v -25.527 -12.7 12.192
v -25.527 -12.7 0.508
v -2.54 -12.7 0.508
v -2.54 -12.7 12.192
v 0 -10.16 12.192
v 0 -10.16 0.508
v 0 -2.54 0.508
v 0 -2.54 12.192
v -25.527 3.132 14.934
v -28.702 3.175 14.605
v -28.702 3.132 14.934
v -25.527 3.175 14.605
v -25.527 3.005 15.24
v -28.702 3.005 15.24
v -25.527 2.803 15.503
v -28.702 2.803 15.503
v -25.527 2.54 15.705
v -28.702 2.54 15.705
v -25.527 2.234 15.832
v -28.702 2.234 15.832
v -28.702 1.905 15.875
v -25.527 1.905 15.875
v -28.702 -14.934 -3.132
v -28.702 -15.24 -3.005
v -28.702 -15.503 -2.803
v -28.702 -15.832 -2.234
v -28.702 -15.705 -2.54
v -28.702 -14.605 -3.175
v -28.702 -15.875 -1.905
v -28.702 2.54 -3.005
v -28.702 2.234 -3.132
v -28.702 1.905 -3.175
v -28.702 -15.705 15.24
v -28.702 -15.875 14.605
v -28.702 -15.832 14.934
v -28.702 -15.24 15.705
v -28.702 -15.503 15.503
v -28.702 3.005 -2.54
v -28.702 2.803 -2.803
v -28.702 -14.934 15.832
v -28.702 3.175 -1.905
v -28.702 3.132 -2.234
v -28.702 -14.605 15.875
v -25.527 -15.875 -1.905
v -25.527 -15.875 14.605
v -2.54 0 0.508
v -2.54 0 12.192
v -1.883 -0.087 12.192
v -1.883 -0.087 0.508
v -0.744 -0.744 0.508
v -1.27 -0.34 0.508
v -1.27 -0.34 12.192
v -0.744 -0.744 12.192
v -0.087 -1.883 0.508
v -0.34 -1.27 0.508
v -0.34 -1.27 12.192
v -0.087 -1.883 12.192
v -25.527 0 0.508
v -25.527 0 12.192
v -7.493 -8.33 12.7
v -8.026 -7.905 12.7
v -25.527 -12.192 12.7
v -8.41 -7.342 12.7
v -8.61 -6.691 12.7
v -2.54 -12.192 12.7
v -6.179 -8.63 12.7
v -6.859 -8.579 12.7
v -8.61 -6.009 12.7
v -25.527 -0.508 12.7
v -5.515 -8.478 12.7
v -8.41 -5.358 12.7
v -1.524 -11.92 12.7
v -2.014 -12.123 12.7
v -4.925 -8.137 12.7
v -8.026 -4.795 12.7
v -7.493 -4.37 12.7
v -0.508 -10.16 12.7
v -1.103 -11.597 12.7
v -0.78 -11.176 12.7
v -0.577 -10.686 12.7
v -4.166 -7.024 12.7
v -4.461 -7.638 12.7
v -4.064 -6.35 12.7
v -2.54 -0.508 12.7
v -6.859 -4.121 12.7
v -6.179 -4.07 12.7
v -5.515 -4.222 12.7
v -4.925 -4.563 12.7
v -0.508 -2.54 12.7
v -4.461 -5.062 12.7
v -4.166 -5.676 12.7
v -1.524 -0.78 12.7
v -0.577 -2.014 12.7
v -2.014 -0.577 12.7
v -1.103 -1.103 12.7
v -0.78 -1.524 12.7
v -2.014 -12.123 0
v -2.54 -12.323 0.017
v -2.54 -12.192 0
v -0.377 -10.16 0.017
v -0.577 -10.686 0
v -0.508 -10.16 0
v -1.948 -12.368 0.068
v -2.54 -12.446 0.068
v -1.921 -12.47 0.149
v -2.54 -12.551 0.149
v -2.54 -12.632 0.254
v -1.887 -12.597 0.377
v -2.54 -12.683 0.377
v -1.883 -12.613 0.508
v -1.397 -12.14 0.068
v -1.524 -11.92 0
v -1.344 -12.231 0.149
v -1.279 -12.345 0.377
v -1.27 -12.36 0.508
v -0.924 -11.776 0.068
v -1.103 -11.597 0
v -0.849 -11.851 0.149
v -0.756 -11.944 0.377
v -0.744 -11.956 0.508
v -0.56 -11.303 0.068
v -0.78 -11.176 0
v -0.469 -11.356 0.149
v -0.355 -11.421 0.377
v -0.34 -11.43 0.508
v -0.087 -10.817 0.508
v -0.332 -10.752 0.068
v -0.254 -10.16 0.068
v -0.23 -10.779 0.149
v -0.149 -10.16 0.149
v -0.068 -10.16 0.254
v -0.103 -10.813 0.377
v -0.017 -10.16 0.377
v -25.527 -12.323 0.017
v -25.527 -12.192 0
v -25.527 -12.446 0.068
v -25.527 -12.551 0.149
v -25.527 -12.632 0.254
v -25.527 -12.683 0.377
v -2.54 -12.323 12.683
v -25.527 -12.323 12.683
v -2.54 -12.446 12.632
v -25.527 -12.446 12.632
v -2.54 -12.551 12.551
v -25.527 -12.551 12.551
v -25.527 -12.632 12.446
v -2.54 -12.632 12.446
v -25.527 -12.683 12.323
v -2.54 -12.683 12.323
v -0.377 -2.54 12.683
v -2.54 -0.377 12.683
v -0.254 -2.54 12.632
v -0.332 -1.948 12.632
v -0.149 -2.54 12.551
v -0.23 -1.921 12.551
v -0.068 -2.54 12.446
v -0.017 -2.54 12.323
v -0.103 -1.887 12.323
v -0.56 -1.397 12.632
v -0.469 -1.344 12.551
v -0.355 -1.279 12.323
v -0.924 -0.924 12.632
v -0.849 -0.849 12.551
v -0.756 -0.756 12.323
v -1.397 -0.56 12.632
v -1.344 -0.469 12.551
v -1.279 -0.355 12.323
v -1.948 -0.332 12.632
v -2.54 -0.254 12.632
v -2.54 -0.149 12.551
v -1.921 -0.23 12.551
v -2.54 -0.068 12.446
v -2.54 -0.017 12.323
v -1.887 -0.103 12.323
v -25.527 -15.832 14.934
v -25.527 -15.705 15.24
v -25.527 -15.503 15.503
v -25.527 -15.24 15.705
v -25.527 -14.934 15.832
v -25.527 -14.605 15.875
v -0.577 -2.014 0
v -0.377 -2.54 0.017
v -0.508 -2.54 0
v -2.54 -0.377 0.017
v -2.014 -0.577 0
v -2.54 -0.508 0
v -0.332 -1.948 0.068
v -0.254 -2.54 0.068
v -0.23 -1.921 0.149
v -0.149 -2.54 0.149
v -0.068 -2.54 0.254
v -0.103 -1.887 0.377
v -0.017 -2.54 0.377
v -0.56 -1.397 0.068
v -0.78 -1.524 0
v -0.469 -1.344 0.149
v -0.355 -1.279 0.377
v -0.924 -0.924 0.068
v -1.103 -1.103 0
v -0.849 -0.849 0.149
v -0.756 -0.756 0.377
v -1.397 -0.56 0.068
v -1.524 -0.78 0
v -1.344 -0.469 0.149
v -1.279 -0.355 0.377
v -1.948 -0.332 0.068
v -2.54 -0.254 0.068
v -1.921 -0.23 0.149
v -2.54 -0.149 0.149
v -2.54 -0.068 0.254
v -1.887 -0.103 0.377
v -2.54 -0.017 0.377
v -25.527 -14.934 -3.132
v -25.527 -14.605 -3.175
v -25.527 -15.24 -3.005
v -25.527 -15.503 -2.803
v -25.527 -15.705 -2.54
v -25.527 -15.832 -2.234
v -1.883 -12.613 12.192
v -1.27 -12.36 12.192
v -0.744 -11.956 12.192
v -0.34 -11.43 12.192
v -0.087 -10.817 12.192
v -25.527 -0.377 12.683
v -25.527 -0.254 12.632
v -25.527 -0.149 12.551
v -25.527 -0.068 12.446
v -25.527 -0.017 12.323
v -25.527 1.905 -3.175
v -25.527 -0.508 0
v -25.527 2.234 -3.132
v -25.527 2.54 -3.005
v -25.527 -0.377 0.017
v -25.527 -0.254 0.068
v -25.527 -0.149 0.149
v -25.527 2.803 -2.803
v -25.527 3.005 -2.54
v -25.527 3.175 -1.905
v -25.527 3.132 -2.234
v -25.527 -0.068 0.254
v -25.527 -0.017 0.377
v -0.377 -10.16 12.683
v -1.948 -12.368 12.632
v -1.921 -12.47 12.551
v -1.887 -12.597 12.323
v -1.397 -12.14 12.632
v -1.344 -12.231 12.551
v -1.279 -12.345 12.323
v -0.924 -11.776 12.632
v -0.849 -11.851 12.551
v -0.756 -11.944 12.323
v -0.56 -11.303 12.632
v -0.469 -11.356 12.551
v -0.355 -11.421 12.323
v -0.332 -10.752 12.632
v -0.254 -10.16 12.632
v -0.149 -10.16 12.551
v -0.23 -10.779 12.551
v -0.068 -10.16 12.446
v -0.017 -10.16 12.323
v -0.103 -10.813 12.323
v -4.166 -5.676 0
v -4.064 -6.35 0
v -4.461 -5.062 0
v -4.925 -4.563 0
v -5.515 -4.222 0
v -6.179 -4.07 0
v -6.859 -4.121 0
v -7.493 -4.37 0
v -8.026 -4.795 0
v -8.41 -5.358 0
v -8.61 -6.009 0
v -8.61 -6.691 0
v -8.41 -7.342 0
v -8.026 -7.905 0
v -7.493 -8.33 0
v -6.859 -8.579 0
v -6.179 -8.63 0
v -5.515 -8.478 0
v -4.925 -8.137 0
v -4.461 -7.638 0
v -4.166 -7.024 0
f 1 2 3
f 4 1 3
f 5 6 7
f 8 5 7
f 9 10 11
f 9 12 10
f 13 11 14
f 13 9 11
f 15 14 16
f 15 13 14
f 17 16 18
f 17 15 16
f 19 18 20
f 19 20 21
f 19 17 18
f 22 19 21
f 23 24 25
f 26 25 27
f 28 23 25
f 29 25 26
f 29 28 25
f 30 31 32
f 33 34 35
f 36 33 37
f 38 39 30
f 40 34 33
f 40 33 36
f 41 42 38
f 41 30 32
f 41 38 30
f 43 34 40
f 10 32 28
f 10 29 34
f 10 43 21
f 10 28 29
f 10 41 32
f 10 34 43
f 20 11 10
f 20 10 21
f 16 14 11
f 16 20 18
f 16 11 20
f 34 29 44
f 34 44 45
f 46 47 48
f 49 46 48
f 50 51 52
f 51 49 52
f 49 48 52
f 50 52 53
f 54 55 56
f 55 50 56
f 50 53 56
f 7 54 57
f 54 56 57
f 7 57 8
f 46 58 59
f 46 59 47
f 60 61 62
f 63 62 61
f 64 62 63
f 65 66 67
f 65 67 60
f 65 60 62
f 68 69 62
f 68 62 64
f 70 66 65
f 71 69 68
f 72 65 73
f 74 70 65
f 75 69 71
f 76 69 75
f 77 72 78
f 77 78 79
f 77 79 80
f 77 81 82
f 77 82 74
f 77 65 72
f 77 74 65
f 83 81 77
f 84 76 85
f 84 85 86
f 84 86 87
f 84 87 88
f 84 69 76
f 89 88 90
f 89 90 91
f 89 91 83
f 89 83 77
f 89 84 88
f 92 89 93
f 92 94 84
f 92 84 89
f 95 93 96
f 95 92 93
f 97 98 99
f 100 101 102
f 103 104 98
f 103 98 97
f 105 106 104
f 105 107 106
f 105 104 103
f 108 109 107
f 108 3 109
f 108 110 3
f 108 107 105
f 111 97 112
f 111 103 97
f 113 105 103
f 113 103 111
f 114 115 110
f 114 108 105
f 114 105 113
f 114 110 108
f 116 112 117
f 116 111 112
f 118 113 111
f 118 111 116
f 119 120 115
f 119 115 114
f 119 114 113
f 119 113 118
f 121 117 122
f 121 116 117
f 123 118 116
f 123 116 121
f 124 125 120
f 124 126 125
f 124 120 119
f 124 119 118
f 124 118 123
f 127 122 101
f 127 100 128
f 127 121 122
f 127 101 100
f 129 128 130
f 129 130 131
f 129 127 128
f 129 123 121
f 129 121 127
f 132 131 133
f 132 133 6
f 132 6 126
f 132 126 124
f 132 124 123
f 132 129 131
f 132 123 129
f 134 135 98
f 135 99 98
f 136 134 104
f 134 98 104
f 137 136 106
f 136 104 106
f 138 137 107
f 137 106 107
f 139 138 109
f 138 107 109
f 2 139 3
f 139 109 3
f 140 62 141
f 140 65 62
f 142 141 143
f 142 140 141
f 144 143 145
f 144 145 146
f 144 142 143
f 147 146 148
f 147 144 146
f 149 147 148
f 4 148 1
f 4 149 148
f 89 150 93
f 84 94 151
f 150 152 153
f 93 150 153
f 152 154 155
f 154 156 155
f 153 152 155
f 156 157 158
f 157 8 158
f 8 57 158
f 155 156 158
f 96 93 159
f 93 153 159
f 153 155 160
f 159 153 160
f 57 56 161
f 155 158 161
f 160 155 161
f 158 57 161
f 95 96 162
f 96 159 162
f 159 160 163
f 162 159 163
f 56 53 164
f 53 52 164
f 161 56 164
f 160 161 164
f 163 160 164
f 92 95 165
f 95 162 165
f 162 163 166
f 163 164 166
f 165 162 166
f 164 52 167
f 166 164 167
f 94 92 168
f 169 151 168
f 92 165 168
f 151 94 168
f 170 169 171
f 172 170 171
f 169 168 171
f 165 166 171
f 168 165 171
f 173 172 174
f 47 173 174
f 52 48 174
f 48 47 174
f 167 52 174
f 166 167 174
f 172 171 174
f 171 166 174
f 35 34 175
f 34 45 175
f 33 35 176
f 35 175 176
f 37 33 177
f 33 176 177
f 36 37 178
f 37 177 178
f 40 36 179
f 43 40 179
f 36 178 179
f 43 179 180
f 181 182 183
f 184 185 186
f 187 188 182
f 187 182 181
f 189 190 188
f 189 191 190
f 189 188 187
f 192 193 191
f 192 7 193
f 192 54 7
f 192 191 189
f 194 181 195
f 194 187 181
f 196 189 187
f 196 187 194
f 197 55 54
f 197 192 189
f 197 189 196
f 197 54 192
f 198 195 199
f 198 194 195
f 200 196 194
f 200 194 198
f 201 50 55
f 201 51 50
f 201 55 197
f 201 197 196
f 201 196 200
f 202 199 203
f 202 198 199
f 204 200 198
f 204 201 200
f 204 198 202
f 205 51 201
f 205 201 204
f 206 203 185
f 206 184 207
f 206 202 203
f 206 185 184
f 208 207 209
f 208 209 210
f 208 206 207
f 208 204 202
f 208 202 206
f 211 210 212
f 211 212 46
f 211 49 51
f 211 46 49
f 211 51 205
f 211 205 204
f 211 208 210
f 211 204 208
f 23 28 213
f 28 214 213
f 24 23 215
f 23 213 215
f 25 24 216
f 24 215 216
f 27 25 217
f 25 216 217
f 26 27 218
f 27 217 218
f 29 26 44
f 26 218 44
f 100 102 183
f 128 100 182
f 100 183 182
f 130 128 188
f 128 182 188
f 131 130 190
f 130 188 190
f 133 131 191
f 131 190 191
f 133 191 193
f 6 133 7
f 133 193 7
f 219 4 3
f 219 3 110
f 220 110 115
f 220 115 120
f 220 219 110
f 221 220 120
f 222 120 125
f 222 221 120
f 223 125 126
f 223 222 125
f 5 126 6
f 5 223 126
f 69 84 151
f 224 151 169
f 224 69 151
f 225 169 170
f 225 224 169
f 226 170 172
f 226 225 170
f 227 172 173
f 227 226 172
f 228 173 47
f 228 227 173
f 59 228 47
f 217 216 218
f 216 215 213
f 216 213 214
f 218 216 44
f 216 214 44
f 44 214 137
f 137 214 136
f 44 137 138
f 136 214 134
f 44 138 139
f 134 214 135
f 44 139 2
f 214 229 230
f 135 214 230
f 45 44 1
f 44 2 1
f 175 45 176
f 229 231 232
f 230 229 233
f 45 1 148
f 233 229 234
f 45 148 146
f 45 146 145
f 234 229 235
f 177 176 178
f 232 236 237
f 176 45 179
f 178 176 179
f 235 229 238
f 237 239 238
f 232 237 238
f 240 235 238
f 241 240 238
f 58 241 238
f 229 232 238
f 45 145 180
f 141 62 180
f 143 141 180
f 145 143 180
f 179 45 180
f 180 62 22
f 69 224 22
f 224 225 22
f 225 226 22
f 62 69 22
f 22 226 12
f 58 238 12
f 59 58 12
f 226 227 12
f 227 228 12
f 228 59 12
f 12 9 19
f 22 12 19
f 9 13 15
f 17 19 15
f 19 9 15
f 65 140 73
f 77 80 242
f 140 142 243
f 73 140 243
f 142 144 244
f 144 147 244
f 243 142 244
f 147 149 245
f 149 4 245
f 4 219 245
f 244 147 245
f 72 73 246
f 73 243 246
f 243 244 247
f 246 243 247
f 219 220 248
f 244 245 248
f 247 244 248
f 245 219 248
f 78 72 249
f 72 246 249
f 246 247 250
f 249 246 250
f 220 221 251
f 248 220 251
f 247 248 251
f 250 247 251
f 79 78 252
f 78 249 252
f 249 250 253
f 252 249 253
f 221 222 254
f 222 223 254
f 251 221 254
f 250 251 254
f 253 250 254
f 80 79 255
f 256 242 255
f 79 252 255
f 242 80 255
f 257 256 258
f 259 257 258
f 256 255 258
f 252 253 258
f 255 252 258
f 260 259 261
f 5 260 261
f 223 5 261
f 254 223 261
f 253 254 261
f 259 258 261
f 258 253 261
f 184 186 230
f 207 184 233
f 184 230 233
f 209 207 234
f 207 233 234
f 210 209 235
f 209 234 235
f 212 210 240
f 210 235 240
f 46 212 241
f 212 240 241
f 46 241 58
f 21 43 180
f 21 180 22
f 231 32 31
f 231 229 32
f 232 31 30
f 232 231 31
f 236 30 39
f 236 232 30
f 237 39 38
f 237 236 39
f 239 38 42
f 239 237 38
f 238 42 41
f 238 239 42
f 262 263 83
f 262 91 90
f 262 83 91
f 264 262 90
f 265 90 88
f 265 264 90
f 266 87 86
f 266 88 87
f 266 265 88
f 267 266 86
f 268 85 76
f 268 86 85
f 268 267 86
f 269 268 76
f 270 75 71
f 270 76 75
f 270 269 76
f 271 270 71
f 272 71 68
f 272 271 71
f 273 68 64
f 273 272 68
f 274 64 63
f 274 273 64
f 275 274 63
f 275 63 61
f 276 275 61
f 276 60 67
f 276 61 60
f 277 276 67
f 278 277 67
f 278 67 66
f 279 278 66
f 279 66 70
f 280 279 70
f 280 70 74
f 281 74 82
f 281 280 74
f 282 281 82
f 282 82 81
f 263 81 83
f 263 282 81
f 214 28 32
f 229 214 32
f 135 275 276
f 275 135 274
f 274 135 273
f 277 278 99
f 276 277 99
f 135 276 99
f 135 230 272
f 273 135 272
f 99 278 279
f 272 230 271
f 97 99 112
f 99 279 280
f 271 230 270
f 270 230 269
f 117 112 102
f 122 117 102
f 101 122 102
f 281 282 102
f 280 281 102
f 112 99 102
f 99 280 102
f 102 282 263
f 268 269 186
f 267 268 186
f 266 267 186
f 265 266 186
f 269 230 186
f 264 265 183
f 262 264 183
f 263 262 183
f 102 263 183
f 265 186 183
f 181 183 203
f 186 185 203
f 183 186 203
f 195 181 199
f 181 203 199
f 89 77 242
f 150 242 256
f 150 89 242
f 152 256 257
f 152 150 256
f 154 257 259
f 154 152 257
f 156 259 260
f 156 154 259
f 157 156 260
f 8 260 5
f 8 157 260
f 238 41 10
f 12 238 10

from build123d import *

# Parameters (mm, degrees)
SKETCH2_W               = 28.702
SKETCH2_H               = 12.7
BOSS_EXTRUDE1_DEPTH     = 12.7
CUT_EXTRUDE1_DEPTH      = 34.858304801
CUT_EXTRUDE1_DEPTH_BACK = 34.858304801
SKETCH3_R               = 2.286
FILLET1_R               = 2.54
SKETCH4_W               = 19.05
SKETCH4_H               = 19.05
BOSS_EXTRUDE2_DEPTH     = 3.175
FILLET2_R               = 0.508
FILLET3_R               = 1.27


with BuildPart() as part:
    # Sketch2 → Boss-Extrude1 (new body)
    with BuildSketch(Plane.XY):
        with Locations((-14.351, -6.35)):
            Rectangle(SKETCH2_W, SKETCH2_H)
    extrude(amount=BOSS_EXTRUDE1_DEPTH)

    # Sketch3 → Cut-Extrude1 (cut, two sides: drawn at the far end of the back side and taken through both)
    with BuildSketch(Plane.XY.offset(12.7).offset(-CUT_EXTRUDE1_DEPTH_BACK)):
        with Locations((-6.35, -6.35)):
            Circle(SKETCH3_R)
    extrude(amount=CUT_EXTRUDE1_DEPTH + CUT_EXTRUDE1_DEPTH_BACK, mode=Mode.SUBTRACT)

    # Fillet1
    fillet1_edges = [part.edges().sort_by_distance(p)[0] for p in [
        (0, -12.7, 6.35),
        (0, 0, 6.35),
    ]]
    fillet(fillet1_edges, radius=FILLET1_R)

    # Sketch4 → Boss-Extrude2 (add)
    with BuildSketch(Plane.ZY.offset(28.702)):
        with Locations((6.35, -6.35)):
            Rectangle(SKETCH4_W, SKETCH4_H)
    extrude(amount=-BOSS_EXTRUDE2_DEPTH)

    # Fillet2
    fillet2_edges = [part.edges().sort_by_distance(p)[0] for p in [
        (0, -6.35, 0),
        (0, -6.35, 12.7),
        (-14.0335, 0, 0),
        (-0.743948776, -0.743948776, 0),
        (-0.743948776, -11.956051224, 0),
        (-14.0335, 0, 12.7),
        (-0.743948776, -0.743948776, 12.7),
        (-0.743948776, -11.956051224, 12.7),
        (-14.0335, -12.7, 0),
        (-14.0335, -12.7, 12.7),
    ]]
    fillet(fillet2_edges, radius=FILLET2_R)

    # Fillet3
    fillet3_edges = [part.edges().sort_by_distance(p)[0] for p in [
        (-27.1145, 3.175, 15.875),
        (-27.1145, -15.875, 15.875),
        (-27.1145, -15.875, -3.175),
        (-27.1145, 3.175, -3.175),
    ]]
    fillet(fillet3_edges, radius=FILLET3_R)


solid = part.part
